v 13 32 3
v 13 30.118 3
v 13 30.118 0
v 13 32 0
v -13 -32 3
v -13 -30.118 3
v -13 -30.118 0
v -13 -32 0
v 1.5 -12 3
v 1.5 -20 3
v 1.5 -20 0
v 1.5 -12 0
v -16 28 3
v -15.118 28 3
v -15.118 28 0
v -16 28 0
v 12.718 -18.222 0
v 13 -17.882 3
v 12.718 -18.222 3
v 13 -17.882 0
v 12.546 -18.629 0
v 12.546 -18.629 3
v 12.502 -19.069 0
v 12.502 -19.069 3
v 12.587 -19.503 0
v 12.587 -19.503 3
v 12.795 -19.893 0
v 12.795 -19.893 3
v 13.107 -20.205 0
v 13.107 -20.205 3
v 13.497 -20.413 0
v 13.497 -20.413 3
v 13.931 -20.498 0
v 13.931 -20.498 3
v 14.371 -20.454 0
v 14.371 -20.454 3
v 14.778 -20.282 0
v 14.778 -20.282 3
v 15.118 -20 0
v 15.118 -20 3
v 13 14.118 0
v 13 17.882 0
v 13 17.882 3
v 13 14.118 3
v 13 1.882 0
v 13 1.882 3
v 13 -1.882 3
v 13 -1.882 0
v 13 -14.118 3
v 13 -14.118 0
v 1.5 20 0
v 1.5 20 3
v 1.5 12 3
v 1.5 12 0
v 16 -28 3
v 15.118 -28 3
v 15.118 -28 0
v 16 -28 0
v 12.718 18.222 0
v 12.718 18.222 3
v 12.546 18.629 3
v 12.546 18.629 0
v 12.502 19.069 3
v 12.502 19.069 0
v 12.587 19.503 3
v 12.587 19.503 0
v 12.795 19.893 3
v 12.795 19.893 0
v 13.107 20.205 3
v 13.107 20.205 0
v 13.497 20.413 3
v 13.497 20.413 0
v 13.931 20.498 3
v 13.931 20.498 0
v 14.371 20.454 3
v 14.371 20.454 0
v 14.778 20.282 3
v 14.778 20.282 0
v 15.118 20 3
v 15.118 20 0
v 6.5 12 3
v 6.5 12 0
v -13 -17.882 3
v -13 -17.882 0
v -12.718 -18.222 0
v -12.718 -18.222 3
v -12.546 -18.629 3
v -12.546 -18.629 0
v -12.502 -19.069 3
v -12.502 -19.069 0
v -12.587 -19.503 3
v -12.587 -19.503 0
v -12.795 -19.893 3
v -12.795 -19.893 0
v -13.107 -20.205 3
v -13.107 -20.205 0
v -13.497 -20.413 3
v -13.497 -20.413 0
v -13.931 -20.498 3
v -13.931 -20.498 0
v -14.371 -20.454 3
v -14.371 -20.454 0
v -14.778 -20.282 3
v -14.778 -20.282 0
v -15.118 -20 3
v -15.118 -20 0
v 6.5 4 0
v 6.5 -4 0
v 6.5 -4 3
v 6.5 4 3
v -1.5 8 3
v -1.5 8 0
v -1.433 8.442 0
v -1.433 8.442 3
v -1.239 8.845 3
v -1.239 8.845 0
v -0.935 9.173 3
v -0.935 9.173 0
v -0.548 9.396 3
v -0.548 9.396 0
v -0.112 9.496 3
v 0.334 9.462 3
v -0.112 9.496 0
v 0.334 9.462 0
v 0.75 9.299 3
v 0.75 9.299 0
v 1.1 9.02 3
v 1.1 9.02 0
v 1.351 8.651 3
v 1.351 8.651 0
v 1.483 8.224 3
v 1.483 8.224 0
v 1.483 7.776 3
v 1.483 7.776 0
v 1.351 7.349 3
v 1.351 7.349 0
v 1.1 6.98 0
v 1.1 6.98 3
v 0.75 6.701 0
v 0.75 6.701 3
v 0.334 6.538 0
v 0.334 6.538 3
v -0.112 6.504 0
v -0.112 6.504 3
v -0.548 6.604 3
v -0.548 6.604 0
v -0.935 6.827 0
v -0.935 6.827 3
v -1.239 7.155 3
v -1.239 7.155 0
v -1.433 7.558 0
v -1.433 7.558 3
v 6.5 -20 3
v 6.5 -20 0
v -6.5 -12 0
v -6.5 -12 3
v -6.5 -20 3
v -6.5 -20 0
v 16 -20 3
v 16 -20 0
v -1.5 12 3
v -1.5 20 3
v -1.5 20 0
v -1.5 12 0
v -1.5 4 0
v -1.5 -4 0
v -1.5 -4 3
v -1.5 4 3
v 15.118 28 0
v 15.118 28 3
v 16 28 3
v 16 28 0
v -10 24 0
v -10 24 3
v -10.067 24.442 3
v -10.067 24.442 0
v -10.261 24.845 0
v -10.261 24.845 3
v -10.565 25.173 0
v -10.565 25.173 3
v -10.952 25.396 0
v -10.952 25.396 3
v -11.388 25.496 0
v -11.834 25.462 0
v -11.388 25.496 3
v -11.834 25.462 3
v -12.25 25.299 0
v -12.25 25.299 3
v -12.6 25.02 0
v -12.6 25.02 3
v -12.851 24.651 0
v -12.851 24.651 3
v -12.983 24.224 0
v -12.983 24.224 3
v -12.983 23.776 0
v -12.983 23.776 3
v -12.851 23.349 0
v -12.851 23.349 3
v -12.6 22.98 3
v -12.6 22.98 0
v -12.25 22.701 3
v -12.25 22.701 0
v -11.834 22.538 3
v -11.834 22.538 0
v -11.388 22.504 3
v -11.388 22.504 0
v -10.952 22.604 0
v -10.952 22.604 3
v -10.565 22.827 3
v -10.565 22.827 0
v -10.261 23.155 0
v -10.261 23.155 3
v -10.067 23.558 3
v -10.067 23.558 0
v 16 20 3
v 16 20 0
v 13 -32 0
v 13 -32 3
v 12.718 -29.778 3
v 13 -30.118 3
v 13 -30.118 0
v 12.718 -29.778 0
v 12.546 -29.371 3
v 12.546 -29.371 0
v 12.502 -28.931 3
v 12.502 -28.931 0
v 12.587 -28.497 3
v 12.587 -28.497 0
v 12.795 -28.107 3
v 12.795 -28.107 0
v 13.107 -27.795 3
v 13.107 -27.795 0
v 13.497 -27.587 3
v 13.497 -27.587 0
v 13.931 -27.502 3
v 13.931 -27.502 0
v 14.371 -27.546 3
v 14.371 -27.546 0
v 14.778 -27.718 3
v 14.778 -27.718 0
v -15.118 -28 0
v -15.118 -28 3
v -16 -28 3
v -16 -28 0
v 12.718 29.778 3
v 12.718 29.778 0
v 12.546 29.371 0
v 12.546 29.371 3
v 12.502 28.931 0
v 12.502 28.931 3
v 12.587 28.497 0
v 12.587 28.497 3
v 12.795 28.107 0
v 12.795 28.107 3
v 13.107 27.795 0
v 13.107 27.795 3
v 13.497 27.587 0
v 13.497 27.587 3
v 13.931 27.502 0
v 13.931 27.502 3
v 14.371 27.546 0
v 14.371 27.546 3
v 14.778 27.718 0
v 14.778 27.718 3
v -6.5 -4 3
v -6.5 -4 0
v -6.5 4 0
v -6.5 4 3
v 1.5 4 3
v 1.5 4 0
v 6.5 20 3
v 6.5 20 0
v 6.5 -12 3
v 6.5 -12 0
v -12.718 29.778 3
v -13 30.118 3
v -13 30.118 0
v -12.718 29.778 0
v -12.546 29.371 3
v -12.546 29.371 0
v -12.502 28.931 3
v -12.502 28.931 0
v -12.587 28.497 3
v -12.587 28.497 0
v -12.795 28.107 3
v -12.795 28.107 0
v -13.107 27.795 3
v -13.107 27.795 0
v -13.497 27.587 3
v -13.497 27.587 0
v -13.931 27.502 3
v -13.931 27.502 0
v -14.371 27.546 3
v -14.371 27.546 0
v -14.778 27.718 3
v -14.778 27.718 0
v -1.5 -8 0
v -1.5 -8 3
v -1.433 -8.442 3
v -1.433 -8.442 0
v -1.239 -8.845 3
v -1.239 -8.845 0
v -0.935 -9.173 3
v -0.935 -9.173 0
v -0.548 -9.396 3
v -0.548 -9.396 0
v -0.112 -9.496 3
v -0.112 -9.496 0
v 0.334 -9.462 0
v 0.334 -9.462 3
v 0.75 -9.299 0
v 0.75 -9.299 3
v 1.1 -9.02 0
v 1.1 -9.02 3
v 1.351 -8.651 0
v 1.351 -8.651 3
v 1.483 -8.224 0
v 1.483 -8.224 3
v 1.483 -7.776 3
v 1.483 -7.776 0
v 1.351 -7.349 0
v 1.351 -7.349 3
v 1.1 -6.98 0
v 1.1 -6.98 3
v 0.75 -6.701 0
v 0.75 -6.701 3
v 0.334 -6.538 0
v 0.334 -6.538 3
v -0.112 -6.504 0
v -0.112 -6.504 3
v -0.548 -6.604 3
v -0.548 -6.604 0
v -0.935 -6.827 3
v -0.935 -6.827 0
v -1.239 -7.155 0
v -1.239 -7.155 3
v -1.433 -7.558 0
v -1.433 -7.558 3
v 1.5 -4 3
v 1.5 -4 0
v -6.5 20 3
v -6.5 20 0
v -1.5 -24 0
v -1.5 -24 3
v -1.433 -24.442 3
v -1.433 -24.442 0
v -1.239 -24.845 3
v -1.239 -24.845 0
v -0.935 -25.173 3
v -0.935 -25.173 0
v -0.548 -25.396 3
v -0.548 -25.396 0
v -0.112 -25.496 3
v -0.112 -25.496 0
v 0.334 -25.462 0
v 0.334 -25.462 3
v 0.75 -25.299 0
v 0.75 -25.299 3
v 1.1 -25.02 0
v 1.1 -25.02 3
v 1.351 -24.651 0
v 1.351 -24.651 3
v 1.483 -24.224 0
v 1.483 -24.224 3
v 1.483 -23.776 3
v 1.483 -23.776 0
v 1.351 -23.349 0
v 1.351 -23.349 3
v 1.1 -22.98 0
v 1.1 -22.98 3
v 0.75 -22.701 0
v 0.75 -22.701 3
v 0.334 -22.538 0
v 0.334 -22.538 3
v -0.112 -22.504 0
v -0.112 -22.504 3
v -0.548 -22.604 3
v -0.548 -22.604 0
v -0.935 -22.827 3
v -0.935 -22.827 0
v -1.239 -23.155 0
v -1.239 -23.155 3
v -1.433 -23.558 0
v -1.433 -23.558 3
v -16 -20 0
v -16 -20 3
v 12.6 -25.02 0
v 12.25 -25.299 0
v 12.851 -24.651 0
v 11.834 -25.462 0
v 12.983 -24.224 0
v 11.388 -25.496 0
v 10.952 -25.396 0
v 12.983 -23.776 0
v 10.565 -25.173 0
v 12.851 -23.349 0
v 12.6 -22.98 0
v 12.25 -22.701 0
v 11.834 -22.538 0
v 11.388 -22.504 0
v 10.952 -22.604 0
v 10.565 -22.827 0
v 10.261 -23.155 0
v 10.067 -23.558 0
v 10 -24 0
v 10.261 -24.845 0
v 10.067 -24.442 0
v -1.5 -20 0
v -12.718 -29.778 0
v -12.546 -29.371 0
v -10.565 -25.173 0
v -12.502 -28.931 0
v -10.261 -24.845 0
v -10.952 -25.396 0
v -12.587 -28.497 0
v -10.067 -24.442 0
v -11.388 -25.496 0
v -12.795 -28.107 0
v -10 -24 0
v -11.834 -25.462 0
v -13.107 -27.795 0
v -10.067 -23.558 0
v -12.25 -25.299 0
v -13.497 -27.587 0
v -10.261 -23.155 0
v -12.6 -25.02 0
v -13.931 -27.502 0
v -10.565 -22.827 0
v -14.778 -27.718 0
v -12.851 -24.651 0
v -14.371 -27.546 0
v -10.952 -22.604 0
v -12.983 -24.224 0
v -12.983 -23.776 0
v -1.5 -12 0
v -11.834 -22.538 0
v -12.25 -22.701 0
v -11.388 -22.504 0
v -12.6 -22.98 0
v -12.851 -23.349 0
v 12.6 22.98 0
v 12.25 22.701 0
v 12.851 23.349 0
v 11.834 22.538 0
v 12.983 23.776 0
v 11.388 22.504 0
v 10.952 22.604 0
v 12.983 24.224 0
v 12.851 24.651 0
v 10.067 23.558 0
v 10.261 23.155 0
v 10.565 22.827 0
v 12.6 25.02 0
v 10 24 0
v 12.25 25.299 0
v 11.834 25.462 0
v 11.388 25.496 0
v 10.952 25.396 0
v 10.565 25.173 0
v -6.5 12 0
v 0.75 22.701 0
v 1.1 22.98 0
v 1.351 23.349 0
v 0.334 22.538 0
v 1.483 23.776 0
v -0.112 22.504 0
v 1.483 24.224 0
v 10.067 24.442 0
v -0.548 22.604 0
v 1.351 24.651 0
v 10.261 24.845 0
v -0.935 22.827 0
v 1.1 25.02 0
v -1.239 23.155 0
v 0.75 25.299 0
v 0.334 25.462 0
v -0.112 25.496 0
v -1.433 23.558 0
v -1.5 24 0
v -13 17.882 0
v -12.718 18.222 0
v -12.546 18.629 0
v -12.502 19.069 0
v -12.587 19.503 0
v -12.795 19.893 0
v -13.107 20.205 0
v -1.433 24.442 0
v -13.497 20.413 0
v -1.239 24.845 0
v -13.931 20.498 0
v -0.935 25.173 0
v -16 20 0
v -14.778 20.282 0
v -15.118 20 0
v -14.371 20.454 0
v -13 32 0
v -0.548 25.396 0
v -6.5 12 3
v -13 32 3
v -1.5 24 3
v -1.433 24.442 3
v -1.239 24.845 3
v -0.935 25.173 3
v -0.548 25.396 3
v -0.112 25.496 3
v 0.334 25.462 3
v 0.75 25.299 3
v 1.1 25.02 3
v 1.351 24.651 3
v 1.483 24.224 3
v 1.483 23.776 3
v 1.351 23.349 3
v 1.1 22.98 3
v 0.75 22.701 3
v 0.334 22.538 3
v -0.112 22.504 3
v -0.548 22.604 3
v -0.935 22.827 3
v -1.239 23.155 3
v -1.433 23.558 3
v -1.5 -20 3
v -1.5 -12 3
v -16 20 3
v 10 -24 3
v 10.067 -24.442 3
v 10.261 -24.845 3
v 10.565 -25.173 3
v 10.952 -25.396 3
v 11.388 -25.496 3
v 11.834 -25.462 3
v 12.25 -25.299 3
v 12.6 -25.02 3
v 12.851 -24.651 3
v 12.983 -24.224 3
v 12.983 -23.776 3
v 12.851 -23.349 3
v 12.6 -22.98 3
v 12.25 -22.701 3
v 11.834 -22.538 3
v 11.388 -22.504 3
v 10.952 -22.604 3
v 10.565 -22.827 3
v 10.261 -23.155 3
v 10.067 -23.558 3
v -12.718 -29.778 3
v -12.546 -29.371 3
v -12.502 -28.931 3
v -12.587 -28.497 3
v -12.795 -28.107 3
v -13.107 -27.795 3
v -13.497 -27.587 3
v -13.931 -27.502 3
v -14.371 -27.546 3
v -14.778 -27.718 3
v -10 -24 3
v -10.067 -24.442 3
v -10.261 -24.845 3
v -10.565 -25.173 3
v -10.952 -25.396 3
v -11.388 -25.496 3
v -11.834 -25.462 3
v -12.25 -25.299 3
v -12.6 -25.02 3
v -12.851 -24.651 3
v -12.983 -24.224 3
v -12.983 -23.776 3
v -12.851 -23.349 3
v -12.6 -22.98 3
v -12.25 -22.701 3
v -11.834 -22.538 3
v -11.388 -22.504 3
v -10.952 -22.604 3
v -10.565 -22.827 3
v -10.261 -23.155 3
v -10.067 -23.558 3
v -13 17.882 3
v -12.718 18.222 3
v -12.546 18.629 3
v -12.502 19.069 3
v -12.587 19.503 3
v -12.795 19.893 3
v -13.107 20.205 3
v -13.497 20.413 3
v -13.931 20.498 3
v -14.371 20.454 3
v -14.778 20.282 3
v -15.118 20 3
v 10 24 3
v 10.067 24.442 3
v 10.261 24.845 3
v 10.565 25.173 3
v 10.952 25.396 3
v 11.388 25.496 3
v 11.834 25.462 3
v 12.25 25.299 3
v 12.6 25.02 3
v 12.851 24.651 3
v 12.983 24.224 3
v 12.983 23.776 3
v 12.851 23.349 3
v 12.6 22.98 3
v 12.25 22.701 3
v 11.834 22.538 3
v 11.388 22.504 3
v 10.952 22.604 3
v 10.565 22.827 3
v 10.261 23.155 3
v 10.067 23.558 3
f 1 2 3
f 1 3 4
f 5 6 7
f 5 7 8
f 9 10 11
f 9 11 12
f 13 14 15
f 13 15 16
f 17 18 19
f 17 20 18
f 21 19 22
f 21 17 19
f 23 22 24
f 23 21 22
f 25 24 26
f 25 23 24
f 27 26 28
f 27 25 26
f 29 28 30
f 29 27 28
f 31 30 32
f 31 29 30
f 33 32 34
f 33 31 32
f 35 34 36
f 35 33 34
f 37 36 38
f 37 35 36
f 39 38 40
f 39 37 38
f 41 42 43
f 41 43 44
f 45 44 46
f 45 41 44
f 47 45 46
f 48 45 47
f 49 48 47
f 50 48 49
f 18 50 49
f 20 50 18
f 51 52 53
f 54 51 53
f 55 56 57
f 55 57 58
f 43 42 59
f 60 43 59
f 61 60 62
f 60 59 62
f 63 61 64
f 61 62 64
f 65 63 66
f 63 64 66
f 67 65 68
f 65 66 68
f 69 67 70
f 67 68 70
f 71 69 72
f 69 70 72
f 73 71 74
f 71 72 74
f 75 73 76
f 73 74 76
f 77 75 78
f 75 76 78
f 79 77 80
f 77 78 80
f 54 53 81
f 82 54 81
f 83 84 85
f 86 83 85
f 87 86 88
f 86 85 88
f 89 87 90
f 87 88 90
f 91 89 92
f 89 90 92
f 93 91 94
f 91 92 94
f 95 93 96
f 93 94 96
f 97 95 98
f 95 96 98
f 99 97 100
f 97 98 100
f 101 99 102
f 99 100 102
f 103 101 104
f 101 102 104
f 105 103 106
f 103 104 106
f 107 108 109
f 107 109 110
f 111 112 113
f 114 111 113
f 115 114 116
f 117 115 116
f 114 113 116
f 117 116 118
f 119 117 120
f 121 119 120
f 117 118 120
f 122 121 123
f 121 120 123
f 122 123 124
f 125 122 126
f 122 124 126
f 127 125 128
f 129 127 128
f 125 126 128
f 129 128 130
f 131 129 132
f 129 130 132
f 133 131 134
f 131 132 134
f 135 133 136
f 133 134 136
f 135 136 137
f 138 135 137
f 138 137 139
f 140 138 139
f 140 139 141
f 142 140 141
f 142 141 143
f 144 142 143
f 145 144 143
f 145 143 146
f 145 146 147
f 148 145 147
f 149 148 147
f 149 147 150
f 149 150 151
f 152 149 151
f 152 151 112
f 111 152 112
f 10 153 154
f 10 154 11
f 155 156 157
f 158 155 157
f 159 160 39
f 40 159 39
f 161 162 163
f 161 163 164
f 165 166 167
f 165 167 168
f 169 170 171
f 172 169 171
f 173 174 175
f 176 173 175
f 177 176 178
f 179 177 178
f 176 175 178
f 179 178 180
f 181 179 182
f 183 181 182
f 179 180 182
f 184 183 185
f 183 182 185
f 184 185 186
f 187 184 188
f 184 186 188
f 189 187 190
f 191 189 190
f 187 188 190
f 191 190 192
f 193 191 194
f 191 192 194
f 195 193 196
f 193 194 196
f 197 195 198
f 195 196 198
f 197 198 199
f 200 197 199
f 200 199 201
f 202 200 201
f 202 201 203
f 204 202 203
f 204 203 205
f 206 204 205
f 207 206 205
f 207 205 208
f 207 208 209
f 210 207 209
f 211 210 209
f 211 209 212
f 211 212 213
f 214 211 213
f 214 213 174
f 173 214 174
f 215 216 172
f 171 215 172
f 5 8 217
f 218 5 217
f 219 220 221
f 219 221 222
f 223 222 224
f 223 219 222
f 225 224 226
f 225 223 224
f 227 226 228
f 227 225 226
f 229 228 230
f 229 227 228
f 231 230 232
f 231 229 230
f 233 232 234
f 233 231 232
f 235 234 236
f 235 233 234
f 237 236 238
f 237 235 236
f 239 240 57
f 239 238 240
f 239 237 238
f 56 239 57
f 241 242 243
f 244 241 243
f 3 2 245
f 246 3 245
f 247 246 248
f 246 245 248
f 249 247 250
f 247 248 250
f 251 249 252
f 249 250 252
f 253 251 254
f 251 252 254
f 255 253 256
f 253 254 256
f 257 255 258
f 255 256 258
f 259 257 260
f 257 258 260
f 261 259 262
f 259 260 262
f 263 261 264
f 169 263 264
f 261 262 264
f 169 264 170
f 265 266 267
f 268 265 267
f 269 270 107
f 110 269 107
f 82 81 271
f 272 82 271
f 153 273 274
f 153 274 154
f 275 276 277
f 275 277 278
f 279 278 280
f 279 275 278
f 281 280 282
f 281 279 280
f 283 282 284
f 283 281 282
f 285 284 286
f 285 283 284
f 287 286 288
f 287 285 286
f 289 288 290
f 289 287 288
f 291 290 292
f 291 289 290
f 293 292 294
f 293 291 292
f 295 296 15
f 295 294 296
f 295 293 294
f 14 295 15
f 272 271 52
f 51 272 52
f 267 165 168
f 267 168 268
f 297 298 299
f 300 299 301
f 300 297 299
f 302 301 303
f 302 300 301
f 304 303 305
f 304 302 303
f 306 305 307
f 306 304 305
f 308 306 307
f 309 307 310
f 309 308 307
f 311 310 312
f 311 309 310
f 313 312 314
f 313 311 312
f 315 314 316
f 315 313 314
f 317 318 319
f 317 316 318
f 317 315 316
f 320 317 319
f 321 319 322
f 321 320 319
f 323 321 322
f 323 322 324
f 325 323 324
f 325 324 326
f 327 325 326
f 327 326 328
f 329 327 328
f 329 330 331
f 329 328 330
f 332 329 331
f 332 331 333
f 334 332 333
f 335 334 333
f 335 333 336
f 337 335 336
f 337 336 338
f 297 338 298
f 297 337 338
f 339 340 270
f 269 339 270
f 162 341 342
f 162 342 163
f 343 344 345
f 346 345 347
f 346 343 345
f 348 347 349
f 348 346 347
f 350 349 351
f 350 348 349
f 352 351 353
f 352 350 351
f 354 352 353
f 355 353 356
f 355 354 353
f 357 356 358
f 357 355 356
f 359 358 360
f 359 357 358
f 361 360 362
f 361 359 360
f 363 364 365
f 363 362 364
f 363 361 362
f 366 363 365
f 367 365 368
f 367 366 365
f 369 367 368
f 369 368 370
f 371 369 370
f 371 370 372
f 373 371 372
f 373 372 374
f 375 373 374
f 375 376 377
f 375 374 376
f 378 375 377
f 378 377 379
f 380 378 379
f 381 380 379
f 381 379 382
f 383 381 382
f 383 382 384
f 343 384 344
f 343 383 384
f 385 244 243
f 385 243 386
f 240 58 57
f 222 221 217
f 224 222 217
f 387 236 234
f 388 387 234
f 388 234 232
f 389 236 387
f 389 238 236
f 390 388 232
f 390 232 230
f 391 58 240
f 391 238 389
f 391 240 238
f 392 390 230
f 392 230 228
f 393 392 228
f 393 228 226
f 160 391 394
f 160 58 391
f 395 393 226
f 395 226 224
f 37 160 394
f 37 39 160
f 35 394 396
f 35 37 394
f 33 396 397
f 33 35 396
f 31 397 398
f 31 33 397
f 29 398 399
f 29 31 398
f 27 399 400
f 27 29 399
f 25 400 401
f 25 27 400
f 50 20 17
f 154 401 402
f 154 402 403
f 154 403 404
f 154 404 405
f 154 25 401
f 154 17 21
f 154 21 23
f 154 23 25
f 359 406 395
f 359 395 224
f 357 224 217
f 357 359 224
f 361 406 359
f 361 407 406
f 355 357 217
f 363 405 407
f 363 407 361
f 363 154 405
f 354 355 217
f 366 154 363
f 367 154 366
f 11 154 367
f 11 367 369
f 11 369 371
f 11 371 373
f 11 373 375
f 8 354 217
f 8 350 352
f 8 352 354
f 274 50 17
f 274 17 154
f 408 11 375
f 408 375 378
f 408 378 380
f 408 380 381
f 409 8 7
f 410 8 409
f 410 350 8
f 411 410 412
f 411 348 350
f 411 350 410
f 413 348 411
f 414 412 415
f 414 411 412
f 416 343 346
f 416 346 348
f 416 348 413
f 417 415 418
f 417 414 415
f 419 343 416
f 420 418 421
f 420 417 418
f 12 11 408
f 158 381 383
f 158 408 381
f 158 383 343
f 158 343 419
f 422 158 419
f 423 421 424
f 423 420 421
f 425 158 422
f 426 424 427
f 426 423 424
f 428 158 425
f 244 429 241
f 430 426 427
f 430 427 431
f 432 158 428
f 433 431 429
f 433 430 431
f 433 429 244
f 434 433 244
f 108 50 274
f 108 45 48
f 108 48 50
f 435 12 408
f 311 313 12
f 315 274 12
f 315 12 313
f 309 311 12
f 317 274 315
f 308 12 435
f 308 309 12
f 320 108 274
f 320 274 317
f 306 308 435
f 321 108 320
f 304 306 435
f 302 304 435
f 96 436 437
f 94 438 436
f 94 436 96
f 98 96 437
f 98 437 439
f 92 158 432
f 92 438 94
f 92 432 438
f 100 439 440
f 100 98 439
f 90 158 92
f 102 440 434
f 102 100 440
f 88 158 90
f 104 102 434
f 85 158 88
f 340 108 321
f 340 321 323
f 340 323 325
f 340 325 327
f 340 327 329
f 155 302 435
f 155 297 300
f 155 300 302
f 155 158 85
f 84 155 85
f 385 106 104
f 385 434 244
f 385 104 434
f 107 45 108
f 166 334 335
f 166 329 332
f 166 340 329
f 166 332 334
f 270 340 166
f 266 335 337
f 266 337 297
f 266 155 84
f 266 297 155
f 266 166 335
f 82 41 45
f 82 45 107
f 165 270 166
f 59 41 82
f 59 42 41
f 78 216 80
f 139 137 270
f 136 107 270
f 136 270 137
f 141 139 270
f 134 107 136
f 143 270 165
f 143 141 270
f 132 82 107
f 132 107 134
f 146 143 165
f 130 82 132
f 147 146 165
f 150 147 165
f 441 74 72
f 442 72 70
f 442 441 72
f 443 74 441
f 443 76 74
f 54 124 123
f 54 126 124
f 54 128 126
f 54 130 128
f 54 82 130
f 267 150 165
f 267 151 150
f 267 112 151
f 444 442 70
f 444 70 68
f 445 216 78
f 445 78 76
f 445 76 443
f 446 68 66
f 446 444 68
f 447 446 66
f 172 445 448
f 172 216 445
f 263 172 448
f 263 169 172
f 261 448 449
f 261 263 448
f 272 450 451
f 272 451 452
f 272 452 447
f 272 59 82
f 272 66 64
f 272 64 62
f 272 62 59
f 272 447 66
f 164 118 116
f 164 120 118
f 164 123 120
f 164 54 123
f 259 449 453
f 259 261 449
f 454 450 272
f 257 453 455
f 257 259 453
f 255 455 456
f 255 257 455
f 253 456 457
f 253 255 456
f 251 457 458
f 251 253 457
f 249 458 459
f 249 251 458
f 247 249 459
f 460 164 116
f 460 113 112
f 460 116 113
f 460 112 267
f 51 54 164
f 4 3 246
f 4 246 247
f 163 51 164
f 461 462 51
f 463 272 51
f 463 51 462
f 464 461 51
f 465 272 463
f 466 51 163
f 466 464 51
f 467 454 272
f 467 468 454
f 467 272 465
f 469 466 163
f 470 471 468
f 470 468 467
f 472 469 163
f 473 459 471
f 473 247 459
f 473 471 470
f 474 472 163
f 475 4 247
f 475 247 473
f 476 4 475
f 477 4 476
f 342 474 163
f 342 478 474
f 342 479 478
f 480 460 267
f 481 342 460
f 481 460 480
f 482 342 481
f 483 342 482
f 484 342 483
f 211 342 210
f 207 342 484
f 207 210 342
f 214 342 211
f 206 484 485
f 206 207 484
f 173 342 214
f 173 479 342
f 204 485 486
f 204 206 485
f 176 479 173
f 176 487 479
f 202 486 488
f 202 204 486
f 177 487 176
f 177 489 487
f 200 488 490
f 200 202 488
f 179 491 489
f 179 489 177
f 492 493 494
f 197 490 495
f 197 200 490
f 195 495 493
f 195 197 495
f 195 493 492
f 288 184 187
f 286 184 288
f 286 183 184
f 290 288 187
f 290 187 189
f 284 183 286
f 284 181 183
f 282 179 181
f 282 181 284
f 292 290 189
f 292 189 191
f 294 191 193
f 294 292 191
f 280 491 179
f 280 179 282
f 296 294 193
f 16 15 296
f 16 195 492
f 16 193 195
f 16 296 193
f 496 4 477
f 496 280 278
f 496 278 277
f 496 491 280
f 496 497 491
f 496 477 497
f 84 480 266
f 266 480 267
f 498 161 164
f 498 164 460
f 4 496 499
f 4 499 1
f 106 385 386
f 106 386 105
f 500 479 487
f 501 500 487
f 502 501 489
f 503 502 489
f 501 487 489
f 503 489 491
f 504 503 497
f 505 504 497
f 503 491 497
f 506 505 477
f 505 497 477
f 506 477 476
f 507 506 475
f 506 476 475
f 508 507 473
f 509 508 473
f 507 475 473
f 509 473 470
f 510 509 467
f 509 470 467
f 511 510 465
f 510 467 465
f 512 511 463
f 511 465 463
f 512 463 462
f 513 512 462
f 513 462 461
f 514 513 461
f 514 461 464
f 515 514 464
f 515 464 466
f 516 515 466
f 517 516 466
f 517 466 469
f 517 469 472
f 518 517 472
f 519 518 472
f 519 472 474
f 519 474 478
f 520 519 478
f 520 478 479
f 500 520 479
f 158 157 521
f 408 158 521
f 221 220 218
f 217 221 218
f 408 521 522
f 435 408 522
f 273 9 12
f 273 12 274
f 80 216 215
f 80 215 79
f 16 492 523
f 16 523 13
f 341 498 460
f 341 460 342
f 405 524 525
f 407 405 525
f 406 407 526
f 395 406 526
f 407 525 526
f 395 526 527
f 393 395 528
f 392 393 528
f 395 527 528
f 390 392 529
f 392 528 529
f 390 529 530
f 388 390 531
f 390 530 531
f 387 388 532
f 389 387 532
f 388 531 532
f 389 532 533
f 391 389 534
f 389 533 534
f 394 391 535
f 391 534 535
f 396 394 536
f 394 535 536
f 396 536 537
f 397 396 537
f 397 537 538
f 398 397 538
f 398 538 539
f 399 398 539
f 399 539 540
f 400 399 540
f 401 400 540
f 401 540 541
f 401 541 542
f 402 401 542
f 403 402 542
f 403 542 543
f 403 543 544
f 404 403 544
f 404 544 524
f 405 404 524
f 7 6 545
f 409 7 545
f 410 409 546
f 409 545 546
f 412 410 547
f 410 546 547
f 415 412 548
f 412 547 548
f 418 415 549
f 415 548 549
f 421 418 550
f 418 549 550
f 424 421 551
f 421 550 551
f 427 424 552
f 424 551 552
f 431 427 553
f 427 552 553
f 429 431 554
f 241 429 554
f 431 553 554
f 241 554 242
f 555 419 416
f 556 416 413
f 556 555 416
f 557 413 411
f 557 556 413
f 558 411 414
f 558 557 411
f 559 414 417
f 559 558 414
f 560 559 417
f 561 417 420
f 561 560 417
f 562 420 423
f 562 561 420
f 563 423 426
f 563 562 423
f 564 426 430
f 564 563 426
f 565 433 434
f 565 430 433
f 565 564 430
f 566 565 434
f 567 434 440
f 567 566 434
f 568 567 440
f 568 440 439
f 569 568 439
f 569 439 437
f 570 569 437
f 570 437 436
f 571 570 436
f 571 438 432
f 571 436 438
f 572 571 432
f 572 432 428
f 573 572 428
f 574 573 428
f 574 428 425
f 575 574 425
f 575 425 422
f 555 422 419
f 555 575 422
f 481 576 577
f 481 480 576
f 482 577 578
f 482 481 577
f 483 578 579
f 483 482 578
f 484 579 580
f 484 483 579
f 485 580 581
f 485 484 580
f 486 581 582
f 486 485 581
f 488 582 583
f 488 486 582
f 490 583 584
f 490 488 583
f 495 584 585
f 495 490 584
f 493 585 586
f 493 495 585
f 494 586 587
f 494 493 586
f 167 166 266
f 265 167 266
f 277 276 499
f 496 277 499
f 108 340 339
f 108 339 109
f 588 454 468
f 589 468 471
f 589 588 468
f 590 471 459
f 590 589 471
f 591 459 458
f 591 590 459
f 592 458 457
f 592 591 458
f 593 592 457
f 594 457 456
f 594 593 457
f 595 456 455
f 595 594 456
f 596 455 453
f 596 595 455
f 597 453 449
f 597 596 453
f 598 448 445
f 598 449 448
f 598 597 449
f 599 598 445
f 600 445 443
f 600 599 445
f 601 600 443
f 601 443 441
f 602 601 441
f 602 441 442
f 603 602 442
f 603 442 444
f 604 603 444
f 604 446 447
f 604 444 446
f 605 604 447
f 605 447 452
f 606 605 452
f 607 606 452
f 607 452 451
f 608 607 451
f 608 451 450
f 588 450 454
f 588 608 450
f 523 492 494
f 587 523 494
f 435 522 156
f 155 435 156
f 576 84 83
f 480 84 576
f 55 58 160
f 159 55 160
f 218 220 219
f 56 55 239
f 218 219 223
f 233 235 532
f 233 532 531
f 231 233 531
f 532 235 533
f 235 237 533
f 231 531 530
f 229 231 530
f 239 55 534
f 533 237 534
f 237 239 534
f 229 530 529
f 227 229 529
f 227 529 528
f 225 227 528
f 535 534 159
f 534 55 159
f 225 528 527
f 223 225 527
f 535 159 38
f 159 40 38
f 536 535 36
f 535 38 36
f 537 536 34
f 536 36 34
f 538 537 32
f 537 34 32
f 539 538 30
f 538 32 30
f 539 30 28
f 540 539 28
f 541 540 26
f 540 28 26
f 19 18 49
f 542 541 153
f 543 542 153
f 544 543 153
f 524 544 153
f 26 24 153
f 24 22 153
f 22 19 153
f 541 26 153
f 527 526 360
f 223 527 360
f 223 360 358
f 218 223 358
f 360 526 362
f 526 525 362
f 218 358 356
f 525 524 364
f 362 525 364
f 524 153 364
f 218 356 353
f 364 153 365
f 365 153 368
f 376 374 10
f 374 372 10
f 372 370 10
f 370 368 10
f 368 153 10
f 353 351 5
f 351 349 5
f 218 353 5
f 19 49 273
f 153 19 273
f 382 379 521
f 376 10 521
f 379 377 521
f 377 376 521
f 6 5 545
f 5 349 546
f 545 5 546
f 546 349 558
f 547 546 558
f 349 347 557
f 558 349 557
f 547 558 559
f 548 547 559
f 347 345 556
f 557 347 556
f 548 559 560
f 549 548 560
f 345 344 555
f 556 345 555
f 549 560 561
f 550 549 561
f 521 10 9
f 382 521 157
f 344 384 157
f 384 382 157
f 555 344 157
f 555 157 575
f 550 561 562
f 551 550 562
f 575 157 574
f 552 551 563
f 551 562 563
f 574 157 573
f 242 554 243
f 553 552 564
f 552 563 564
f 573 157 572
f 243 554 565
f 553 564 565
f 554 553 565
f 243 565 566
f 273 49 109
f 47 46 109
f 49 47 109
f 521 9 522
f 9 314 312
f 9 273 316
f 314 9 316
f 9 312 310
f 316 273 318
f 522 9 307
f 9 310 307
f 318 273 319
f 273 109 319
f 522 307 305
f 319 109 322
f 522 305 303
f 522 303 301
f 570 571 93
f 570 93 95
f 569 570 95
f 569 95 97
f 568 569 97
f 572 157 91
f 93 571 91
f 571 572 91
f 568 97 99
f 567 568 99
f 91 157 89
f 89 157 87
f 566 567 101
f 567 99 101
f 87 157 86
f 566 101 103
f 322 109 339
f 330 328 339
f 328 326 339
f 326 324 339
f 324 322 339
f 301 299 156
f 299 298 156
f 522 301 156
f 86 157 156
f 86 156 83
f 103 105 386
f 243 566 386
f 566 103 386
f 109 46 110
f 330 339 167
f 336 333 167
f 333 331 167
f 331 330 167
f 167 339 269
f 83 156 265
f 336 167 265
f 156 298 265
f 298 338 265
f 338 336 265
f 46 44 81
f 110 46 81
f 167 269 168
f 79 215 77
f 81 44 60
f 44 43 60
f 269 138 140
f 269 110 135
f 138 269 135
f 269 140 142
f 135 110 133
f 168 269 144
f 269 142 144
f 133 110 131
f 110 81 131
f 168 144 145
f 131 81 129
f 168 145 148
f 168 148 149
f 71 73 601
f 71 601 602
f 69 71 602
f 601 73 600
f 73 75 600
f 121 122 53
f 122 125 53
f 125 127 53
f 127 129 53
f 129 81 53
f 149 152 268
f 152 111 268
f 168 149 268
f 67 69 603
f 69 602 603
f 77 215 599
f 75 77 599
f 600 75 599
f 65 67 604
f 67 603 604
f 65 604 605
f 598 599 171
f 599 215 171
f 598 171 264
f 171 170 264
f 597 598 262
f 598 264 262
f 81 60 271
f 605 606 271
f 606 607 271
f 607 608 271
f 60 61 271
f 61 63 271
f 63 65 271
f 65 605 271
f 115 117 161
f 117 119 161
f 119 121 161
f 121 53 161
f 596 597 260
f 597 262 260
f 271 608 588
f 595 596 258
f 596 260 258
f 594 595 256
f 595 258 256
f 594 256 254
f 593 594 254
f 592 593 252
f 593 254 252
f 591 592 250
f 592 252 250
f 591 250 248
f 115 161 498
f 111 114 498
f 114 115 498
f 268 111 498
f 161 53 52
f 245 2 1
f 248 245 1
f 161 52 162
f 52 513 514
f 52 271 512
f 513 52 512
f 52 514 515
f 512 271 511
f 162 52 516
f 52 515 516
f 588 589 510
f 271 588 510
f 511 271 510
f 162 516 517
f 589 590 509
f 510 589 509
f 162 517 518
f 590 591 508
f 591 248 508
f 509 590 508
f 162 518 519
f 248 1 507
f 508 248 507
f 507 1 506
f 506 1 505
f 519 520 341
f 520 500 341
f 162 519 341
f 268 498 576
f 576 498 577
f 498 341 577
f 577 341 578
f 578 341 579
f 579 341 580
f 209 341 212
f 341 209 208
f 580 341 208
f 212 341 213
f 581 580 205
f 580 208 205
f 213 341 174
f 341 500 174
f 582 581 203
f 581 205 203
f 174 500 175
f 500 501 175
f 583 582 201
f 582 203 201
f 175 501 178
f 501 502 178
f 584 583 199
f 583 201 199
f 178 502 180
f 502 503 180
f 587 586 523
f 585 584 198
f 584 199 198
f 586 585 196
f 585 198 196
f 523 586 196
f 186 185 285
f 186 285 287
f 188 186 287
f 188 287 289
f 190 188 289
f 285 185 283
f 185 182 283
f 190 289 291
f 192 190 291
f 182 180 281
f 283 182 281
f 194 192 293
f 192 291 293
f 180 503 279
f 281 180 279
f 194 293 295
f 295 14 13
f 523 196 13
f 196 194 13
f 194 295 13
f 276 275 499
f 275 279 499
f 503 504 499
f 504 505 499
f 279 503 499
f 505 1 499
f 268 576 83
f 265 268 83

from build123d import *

# Parameters (mm, degrees)
SKETCH_1_W                = 32
SKETCH_1_H                = 64
EXTRUDE_1_DEPTH           = 3
SKETCH_2_W                = 2.5
SKETCH_2_H                = 4
CUT_EXTRUDE_1_DEPTH       = 36.902646142
MIRROR_2_COPY_1_SKETCH_W  = 2.5
MIRROR_2_COPY_1_SKETCH_H  = 4
MIRROR_2_COPY_1_DEPTH     = 36.902646142
SKETCH_4_W                = 3
SKETCH_4_H                = 8
CUT_EXTRUDE_3_DEPTH       = 10
SKETCH_6_W                = 3
SKETCH_6_H                = 4
CUT_EXTRUDE_5_DEPTH       = 36.902646142
MIRROR_9_COPY_1_SKETCH_W  = 3
MIRROR_9_COPY_1_SKETCH_H  = 4
MIRROR_9_COPY_1_DEPTH     = 36.902646142
SKETCH_8_R                = 1.5
CUT_EXTRUDE_6_DEPTH       = 36.902646142
MIRROR_11_COPY_1_SKETCH_R = 1.5
MIRROR_11_COPY_1_DEPTH    = 36.902646142
SKETCH_10_R               = 1.5
CUT_EXTRUDE_8_DEPTH       = 36.902646142
MIRROR_15_COPY_1_SKETCH_R = 1.5
MIRROR_15_COPY_1_DEPTH    = 36.902646142
SKETCH_11_R               = 1.5
CUT_EXTRUDE_9_DEPTH       = 36.902646142
MIRROR_17_COPY_1_SKETCH_R = 1.5
MIRROR_17_COPY_1_DEPTH    = 36.902646142
SKETCH_12_W               = 3
SKETCH_12_H               = 8
CUT_EXTRUDE_10_DEPTH      = 36.902646142
MIRROR_19_COPY_1_SKETCH_W = 3
MIRROR_19_COPY_1_SKETCH_H = 8
MIRROR_19_COPY_1_DEPTH    = 36.902646142
SKETCH_13_R               = 1.5
CUT_EXTRUDE_11_DEPTH      = 36.902646142
MIRROR_21_COPY_1_SKETCH_R = 1.5
MIRROR_21_COPY_1_DEPTH    = 36.902646142
SKETCH_14_W               = 5
SKETCH_14_H               = 8
CUT_EXTRUDE_12_DEPTH      = 36.902646142
SKETCH_15_R               = 1.5
CUT_EXTRUDE_13_DEPTH      = 36.902646142
EXTRUDE_START             = -3
SKETCH_16_R               = 1.5
EXTRUDE_2_DEPTH           = 3
SKETCH_17_R               = 1.5
EXTRUDE_3_DEPTH           = 3
SKETCH_18_W               = 3.452729718
SKETCH_18_H               = 30.432996322
SKETCH_18_W_2             = 3.815279569
CUT_EXTRUDE_14_DEPTH      = 36.902646142


with BuildPart() as part:
    # 草图1 → 凸台-拉伸1 (new body)
    with BuildSketch(Plane.XY):
        Rectangle(SKETCH_1_W, SKETCH_1_H)
    extrude(amount=EXTRUDE_1_DEPTH)

    # 草图2 → 切除-拉伸1 (cut, through all)
    with BuildSketch(Plane.XY.offset(3)):
        Polygon((4, 16), (4, 12), (6.5, 12), (6.5, 20), (1.5, 20), (1.5, 16), align=None)
        with Locations((2.75, 14)):
            Rectangle(SKETCH_2_W, SKETCH_2_H)
    cut_extrude_1 = extrude(amount=-CUT_EXTRUDE_1_DEPTH, mode=Mode.SUBTRACT)

    # 镜向1: 切除-拉伸1 across plane
    add(cut_extrude_1.mirror(Plane(origin=(0, 0, 0), x_dir=(0, 0, 1), z_dir=(1, 0, 0))), mode=Mode.SUBTRACT)

    # 镜向2: 切除-拉伸1 across plane
    add(cut_extrude_1.mirror(Plane.ZX), mode=Mode.SUBTRACT)

    # 镜向2 copy 1 sketch → 镜向2 copy 1 (cut, through all)
    with BuildSketch(Plane(origin=(0, 0, 3), x_dir=(-1, 0, 0), z_dir=(0, 0, 1))):
        Polygon((4, 16), (4, 12), (6.5, 12), (6.5, 20), (1.5, 20), (1.5, 16), align=None)
        with Locations((2.75, 14)):
            Rectangle(MIRROR_2_COPY_1_SKETCH_W, MIRROR_2_COPY_1_SKETCH_H)
    extrude(amount=-MIRROR_2_COPY_1_DEPTH, mode=Mode.SUBTRACT)

    # 草图4 → 切除-拉伸3 (cut)
    with BuildSketch(Plane.XY.offset(3)):
        with Locations((14.5, 0)):
            Rectangle(SKETCH_4_W, SKETCH_4_H)
    cut_extrude_3 = extrude(amount=-CUT_EXTRUDE_3_DEPTH, mode=Mode.SUBTRACT)

    # 镜向5: 切除-拉伸3 across plane
    add(cut_extrude_3.mirror(Plane(origin=(0, 0, 0), x_dir=(0, 0, 1), z_dir=(1, 0, 0))), mode=Mode.SUBTRACT)

    # 草图6 → 切除-拉伸5 (cut, through all)
    with BuildSketch(Plane.XY.offset(3)):
        with Locations((14.5, 30)):
            Rectangle(SKETCH_6_W, SKETCH_6_H)
    cut_extrude_5 = extrude(amount=-CUT_EXTRUDE_5_DEPTH, mode=Mode.SUBTRACT)

    # 镜向8: 切除-拉伸5 across plane
    add(cut_extrude_5.mirror(Plane.ZX), mode=Mode.SUBTRACT)

    # 镜向9: 切除-拉伸5 across plane
    add(cut_extrude_5.mirror(Plane(origin=(0, 0, 0), x_dir=(0, 0, 1), z_dir=(1, 0, 0))), mode=Mode.SUBTRACT)

    # 镜向9 copy 1 sketch → 镜向9 copy 1 (cut, through all)
    with BuildSketch(Plane(origin=(0, 0, 3), x_dir=(-1, 0, 0), z_dir=(0, 0, 1))):
        with Locations((14.5, 30)):
            Rectangle(MIRROR_9_COPY_1_SKETCH_W, MIRROR_9_COPY_1_SKETCH_H)
    extrude(amount=-MIRROR_9_COPY_1_DEPTH, mode=Mode.SUBTRACT)

    # 草图8 → 切除-拉伸6 (cut, through all)
    with BuildSketch(Plane.XY.offset(3)):
        with Locations((14, 29)):
            Circle(SKETCH_8_R)
    cut_extrude_6 = extrude(amount=-CUT_EXTRUDE_6_DEPTH, mode=Mode.SUBTRACT)

    # 镜向10: 切除-拉伸6 across plane
    add(cut_extrude_6.mirror(Plane(origin=(0, 0, 0), x_dir=(0, 0, 1), z_dir=(1, 0, 0))), mode=Mode.SUBTRACT)

    # 镜向11: 切除-拉伸6 across plane
    add(cut_extrude_6.mirror(Plane.ZX), mode=Mode.SUBTRACT)

    # 镜向11 copy 1 sketch → 镜向11 copy 1 (cut, through all)
    with BuildSketch(Plane(origin=(0, 0, 3), x_dir=(-1, 0, 0), z_dir=(0, 0, 1))):
        with Locations((14, 29)):
            Circle(MIRROR_11_COPY_1_SKETCH_R)
    extrude(amount=-MIRROR_11_COPY_1_DEPTH, mode=Mode.SUBTRACT)

    # 草图10 → 切除-拉伸8 (cut, through all)
    with BuildSketch(Plane.XY.offset(3)):
        with Locations((-14, 3)):
            Circle(SKETCH_10_R)
    cut_extrude_8 = extrude(amount=-CUT_EXTRUDE_8_DEPTH, mode=Mode.SUBTRACT)

    # 镜向14: 切除-拉伸8 across plane
    add(cut_extrude_8.mirror(Plane.ZX), mode=Mode.SUBTRACT)

    # 镜向15: 切除-拉伸8 across plane
    add(cut_extrude_8.mirror(Plane(origin=(0, 0, 0), x_dir=(0, 0, 1), z_dir=(1, 0, 0))), mode=Mode.SUBTRACT)

    # 镜向15 copy 1 sketch → 镜向15 copy 1 (cut, through all)
    with BuildSketch(Plane(origin=(0, 0, 3), x_dir=(-1, 0, 0), z_dir=(0, 0, 1))):
        with Locations((-14, 3)):
            Circle(MIRROR_15_COPY_1_SKETCH_R)
    extrude(amount=-MIRROR_15_COPY_1_DEPTH, mode=Mode.SUBTRACT)

    # 草图11 → 切除-拉伸9 (cut, through all)
    with BuildSketch(Plane.XY.offset(3)):
        with Locations((-11.5, 8)):
            Circle(SKETCH_11_R)
        with Locations((-11.5, 24)):
            Circle(SKETCH_11_R)
    cut_extrude_9 = extrude(amount=-CUT_EXTRUDE_9_DEPTH, mode=Mode.SUBTRACT)

    # 镜向16: 切除-拉伸9 across plane
    add(cut_extrude_9.mirror(Plane(origin=(0, 0, 0), x_dir=(0, 0, 1), z_dir=(1, 0, 0))), mode=Mode.SUBTRACT)

    # 镜向17: 切除-拉伸9 across plane
    add(cut_extrude_9.mirror(Plane.ZX), mode=Mode.SUBTRACT)

    # 镜向17 copy 1 sketch → 镜向17 copy 1 (cut, through all)
    with BuildSketch(Plane(origin=(0, 0, 3), x_dir=(-1, 0, 0), z_dir=(0, 0, 1))):
        with Locations((-11.5, 8)):
            Circle(MIRROR_17_COPY_1_SKETCH_R)
        with Locations((-11.5, 24)):
            Circle(MIRROR_17_COPY_1_SKETCH_R)
    extrude(amount=-MIRROR_17_COPY_1_DEPTH, mode=Mode.SUBTRACT)

    # 草图12 → 切除-拉伸10 (cut, through all)
    with BuildSketch(Plane(origin=(0, 0, 0), x_dir=(-1, 0, 0), z_dir=(0, 0, -1))):
        with Locations((-14.5, 16)):
            Rectangle(SKETCH_12_W, SKETCH_12_H)
    cut_extrude_10 = extrude(amount=-CUT_EXTRUDE_10_DEPTH, mode=Mode.SUBTRACT)

    # 镜向18: 切除-拉伸10 across plane
    add(cut_extrude_10.mirror(Plane(origin=(0, 0, 0), x_dir=(0, 0, 1), z_dir=(1, 0, 0))), mode=Mode.SUBTRACT)

    # 镜向19: 切除-拉伸10 across plane
    add(cut_extrude_10.mirror(Plane.ZX), mode=Mode.SUBTRACT)

    # 镜向19 copy 1 sketch → 镜向19 copy 1 (cut, through all)
    with BuildSketch(Plane(origin=(0, 0, 0), x_dir=(1, 0, 0), z_dir=(0, 0, -1))):
        with Locations((-14.5, 16)):
            Rectangle(MIRROR_19_COPY_1_SKETCH_W, MIRROR_19_COPY_1_SKETCH_H)
    extrude(amount=-MIRROR_19_COPY_1_DEPTH, mode=Mode.SUBTRACT)

    # 草图13 → 切除-拉伸11 (cut, through all)
    with BuildSketch(Plane(origin=(0, 0, 0), x_dir=(-1, 0, 0), z_dir=(0, 0, -1))):
        with Locations((-14, 19)):
            Circle(SKETCH_13_R)
        with Locations((-14, 13)):
            Circle(SKETCH_13_R)
    cut_extrude_11 = extrude(amount=-CUT_EXTRUDE_11_DEPTH, mode=Mode.SUBTRACT)

    # 镜向20: 切除-拉伸11 across plane
    add(cut_extrude_11.mirror(Plane(origin=(0, 0, 0), x_dir=(0, 0, 1), z_dir=(1, 0, 0))), mode=Mode.SUBTRACT)

    # 镜向21: 切除-拉伸11 across plane
    add(cut_extrude_11.mirror(Plane.ZX), mode=Mode.SUBTRACT)

    # 镜向21 copy 1 sketch → 镜向21 copy 1 (cut, through all)
    with BuildSketch(Plane(origin=(0, 0, 0), x_dir=(1, 0, 0), z_dir=(0, 0, -1))):
        with Locations((-14, 19)):
            Circle(MIRROR_21_COPY_1_SKETCH_R)
        with Locations((-14, 13)):
            Circle(MIRROR_21_COPY_1_SKETCH_R)
    extrude(amount=-MIRROR_21_COPY_1_DEPTH, mode=Mode.SUBTRACT)

    # 草图14 → 切除-拉伸12 (cut, through all)
    with BuildSketch(Plane(origin=(0, 0, 0), x_dir=(-1, 0, 0), z_dir=(0, 0, -1))):
        with Locations((4, 0)):
            Rectangle(SKETCH_14_W, SKETCH_14_H)
    cut_extrude_12 = extrude(amount=-CUT_EXTRUDE_12_DEPTH, mode=Mode.SUBTRACT)

    # 镜向22: 切除-拉伸12 across plane
    add(cut_extrude_12.mirror(Plane(origin=(0, 0, 0), x_dir=(0, 0, 1), z_dir=(1, 0, 0))), mode=Mode.SUBTRACT)

    # 草图15 → 切除-拉伸13 (cut, through all)
    with BuildSketch(Plane(origin=(0, 0, 0), x_dir=(-1, 0, 0), z_dir=(0, 0, -1))):
        with Locations((0, 8)):
            Circle(SKETCH_15_R)
        with Locations((0, 24)):
            Circle(SKETCH_15_R)
    cut_extrude_13 = extrude(amount=-CUT_EXTRUDE_13_DEPTH, mode=Mode.SUBTRACT)

    # 镜向23: 切除-拉伸13 across plane
    add(cut_extrude_13.mirror(Plane.ZX), mode=Mode.SUBTRACT)

    # 草图16 → 凸台-拉伸2 (add)
    with BuildSketch(Plane(origin=(0, 0, 0), x_dir=(-1, 0, 0), z_dir=(0, 0, -1)).offset(EXTRUDE_START)):
        with Locations((-11.5, 8)):
            Circle(SKETCH_16_R)
        with Locations((11.5, 8)):
            Circle(SKETCH_16_R)
        with Locations((11.5, -8)):
            Circle(SKETCH_16_R)
        with Locations((-11.5, -8)):
            Circle(SKETCH_16_R)
    extrude(amount=EXTRUDE_2_DEPTH)

    # 草图17 → 凸台-拉伸3 (add)
    with BuildSketch(Plane(origin=(0, 0, 0), x_dir=(-1, 0, 0), z_dir=(0, 0, -1))):
        with Locations((14, 13)):
            Circle(SKETCH_17_R)
        with Locations((-14, 13)):
            Circle(SKETCH_17_R)
        with Locations((-14, 3)):
            Circle(SKETCH_17_R)
        with Locations((14, 3)):
            Circle(SKETCH_17_R)
        with Locations((14, -3)):
            Circle(SKETCH_17_R)
        with Locations((-14, -3)):
            Circle(SKETCH_17_R)
        with Locations((-14, -13)):
            Circle(SKETCH_17_R)
        with Locations((14, -13)):
            Circle(SKETCH_17_R)
    extrude(amount=-EXTRUDE_3_DEPTH)

    # 草图18 → 切除-拉伸14 (cut, through all)
    with BuildSketch(Plane(origin=(0, 0, 0), x_dir=(-1, 0, 0), z_dir=(0, 0, -1))):
        with Locations((14.726364859, 0.092049044)):
            Rectangle(SKETCH_18_W, SKETCH_18_H)
        with Locations((-14.907639785, 0.092049044)):
            Rectangle(SKETCH_18_W_2, SKETCH_18_H)
    extrude(amount=-CUT_EXTRUDE_14_DEPTH, mode=Mode.SUBTRACT)


solid = part.part
